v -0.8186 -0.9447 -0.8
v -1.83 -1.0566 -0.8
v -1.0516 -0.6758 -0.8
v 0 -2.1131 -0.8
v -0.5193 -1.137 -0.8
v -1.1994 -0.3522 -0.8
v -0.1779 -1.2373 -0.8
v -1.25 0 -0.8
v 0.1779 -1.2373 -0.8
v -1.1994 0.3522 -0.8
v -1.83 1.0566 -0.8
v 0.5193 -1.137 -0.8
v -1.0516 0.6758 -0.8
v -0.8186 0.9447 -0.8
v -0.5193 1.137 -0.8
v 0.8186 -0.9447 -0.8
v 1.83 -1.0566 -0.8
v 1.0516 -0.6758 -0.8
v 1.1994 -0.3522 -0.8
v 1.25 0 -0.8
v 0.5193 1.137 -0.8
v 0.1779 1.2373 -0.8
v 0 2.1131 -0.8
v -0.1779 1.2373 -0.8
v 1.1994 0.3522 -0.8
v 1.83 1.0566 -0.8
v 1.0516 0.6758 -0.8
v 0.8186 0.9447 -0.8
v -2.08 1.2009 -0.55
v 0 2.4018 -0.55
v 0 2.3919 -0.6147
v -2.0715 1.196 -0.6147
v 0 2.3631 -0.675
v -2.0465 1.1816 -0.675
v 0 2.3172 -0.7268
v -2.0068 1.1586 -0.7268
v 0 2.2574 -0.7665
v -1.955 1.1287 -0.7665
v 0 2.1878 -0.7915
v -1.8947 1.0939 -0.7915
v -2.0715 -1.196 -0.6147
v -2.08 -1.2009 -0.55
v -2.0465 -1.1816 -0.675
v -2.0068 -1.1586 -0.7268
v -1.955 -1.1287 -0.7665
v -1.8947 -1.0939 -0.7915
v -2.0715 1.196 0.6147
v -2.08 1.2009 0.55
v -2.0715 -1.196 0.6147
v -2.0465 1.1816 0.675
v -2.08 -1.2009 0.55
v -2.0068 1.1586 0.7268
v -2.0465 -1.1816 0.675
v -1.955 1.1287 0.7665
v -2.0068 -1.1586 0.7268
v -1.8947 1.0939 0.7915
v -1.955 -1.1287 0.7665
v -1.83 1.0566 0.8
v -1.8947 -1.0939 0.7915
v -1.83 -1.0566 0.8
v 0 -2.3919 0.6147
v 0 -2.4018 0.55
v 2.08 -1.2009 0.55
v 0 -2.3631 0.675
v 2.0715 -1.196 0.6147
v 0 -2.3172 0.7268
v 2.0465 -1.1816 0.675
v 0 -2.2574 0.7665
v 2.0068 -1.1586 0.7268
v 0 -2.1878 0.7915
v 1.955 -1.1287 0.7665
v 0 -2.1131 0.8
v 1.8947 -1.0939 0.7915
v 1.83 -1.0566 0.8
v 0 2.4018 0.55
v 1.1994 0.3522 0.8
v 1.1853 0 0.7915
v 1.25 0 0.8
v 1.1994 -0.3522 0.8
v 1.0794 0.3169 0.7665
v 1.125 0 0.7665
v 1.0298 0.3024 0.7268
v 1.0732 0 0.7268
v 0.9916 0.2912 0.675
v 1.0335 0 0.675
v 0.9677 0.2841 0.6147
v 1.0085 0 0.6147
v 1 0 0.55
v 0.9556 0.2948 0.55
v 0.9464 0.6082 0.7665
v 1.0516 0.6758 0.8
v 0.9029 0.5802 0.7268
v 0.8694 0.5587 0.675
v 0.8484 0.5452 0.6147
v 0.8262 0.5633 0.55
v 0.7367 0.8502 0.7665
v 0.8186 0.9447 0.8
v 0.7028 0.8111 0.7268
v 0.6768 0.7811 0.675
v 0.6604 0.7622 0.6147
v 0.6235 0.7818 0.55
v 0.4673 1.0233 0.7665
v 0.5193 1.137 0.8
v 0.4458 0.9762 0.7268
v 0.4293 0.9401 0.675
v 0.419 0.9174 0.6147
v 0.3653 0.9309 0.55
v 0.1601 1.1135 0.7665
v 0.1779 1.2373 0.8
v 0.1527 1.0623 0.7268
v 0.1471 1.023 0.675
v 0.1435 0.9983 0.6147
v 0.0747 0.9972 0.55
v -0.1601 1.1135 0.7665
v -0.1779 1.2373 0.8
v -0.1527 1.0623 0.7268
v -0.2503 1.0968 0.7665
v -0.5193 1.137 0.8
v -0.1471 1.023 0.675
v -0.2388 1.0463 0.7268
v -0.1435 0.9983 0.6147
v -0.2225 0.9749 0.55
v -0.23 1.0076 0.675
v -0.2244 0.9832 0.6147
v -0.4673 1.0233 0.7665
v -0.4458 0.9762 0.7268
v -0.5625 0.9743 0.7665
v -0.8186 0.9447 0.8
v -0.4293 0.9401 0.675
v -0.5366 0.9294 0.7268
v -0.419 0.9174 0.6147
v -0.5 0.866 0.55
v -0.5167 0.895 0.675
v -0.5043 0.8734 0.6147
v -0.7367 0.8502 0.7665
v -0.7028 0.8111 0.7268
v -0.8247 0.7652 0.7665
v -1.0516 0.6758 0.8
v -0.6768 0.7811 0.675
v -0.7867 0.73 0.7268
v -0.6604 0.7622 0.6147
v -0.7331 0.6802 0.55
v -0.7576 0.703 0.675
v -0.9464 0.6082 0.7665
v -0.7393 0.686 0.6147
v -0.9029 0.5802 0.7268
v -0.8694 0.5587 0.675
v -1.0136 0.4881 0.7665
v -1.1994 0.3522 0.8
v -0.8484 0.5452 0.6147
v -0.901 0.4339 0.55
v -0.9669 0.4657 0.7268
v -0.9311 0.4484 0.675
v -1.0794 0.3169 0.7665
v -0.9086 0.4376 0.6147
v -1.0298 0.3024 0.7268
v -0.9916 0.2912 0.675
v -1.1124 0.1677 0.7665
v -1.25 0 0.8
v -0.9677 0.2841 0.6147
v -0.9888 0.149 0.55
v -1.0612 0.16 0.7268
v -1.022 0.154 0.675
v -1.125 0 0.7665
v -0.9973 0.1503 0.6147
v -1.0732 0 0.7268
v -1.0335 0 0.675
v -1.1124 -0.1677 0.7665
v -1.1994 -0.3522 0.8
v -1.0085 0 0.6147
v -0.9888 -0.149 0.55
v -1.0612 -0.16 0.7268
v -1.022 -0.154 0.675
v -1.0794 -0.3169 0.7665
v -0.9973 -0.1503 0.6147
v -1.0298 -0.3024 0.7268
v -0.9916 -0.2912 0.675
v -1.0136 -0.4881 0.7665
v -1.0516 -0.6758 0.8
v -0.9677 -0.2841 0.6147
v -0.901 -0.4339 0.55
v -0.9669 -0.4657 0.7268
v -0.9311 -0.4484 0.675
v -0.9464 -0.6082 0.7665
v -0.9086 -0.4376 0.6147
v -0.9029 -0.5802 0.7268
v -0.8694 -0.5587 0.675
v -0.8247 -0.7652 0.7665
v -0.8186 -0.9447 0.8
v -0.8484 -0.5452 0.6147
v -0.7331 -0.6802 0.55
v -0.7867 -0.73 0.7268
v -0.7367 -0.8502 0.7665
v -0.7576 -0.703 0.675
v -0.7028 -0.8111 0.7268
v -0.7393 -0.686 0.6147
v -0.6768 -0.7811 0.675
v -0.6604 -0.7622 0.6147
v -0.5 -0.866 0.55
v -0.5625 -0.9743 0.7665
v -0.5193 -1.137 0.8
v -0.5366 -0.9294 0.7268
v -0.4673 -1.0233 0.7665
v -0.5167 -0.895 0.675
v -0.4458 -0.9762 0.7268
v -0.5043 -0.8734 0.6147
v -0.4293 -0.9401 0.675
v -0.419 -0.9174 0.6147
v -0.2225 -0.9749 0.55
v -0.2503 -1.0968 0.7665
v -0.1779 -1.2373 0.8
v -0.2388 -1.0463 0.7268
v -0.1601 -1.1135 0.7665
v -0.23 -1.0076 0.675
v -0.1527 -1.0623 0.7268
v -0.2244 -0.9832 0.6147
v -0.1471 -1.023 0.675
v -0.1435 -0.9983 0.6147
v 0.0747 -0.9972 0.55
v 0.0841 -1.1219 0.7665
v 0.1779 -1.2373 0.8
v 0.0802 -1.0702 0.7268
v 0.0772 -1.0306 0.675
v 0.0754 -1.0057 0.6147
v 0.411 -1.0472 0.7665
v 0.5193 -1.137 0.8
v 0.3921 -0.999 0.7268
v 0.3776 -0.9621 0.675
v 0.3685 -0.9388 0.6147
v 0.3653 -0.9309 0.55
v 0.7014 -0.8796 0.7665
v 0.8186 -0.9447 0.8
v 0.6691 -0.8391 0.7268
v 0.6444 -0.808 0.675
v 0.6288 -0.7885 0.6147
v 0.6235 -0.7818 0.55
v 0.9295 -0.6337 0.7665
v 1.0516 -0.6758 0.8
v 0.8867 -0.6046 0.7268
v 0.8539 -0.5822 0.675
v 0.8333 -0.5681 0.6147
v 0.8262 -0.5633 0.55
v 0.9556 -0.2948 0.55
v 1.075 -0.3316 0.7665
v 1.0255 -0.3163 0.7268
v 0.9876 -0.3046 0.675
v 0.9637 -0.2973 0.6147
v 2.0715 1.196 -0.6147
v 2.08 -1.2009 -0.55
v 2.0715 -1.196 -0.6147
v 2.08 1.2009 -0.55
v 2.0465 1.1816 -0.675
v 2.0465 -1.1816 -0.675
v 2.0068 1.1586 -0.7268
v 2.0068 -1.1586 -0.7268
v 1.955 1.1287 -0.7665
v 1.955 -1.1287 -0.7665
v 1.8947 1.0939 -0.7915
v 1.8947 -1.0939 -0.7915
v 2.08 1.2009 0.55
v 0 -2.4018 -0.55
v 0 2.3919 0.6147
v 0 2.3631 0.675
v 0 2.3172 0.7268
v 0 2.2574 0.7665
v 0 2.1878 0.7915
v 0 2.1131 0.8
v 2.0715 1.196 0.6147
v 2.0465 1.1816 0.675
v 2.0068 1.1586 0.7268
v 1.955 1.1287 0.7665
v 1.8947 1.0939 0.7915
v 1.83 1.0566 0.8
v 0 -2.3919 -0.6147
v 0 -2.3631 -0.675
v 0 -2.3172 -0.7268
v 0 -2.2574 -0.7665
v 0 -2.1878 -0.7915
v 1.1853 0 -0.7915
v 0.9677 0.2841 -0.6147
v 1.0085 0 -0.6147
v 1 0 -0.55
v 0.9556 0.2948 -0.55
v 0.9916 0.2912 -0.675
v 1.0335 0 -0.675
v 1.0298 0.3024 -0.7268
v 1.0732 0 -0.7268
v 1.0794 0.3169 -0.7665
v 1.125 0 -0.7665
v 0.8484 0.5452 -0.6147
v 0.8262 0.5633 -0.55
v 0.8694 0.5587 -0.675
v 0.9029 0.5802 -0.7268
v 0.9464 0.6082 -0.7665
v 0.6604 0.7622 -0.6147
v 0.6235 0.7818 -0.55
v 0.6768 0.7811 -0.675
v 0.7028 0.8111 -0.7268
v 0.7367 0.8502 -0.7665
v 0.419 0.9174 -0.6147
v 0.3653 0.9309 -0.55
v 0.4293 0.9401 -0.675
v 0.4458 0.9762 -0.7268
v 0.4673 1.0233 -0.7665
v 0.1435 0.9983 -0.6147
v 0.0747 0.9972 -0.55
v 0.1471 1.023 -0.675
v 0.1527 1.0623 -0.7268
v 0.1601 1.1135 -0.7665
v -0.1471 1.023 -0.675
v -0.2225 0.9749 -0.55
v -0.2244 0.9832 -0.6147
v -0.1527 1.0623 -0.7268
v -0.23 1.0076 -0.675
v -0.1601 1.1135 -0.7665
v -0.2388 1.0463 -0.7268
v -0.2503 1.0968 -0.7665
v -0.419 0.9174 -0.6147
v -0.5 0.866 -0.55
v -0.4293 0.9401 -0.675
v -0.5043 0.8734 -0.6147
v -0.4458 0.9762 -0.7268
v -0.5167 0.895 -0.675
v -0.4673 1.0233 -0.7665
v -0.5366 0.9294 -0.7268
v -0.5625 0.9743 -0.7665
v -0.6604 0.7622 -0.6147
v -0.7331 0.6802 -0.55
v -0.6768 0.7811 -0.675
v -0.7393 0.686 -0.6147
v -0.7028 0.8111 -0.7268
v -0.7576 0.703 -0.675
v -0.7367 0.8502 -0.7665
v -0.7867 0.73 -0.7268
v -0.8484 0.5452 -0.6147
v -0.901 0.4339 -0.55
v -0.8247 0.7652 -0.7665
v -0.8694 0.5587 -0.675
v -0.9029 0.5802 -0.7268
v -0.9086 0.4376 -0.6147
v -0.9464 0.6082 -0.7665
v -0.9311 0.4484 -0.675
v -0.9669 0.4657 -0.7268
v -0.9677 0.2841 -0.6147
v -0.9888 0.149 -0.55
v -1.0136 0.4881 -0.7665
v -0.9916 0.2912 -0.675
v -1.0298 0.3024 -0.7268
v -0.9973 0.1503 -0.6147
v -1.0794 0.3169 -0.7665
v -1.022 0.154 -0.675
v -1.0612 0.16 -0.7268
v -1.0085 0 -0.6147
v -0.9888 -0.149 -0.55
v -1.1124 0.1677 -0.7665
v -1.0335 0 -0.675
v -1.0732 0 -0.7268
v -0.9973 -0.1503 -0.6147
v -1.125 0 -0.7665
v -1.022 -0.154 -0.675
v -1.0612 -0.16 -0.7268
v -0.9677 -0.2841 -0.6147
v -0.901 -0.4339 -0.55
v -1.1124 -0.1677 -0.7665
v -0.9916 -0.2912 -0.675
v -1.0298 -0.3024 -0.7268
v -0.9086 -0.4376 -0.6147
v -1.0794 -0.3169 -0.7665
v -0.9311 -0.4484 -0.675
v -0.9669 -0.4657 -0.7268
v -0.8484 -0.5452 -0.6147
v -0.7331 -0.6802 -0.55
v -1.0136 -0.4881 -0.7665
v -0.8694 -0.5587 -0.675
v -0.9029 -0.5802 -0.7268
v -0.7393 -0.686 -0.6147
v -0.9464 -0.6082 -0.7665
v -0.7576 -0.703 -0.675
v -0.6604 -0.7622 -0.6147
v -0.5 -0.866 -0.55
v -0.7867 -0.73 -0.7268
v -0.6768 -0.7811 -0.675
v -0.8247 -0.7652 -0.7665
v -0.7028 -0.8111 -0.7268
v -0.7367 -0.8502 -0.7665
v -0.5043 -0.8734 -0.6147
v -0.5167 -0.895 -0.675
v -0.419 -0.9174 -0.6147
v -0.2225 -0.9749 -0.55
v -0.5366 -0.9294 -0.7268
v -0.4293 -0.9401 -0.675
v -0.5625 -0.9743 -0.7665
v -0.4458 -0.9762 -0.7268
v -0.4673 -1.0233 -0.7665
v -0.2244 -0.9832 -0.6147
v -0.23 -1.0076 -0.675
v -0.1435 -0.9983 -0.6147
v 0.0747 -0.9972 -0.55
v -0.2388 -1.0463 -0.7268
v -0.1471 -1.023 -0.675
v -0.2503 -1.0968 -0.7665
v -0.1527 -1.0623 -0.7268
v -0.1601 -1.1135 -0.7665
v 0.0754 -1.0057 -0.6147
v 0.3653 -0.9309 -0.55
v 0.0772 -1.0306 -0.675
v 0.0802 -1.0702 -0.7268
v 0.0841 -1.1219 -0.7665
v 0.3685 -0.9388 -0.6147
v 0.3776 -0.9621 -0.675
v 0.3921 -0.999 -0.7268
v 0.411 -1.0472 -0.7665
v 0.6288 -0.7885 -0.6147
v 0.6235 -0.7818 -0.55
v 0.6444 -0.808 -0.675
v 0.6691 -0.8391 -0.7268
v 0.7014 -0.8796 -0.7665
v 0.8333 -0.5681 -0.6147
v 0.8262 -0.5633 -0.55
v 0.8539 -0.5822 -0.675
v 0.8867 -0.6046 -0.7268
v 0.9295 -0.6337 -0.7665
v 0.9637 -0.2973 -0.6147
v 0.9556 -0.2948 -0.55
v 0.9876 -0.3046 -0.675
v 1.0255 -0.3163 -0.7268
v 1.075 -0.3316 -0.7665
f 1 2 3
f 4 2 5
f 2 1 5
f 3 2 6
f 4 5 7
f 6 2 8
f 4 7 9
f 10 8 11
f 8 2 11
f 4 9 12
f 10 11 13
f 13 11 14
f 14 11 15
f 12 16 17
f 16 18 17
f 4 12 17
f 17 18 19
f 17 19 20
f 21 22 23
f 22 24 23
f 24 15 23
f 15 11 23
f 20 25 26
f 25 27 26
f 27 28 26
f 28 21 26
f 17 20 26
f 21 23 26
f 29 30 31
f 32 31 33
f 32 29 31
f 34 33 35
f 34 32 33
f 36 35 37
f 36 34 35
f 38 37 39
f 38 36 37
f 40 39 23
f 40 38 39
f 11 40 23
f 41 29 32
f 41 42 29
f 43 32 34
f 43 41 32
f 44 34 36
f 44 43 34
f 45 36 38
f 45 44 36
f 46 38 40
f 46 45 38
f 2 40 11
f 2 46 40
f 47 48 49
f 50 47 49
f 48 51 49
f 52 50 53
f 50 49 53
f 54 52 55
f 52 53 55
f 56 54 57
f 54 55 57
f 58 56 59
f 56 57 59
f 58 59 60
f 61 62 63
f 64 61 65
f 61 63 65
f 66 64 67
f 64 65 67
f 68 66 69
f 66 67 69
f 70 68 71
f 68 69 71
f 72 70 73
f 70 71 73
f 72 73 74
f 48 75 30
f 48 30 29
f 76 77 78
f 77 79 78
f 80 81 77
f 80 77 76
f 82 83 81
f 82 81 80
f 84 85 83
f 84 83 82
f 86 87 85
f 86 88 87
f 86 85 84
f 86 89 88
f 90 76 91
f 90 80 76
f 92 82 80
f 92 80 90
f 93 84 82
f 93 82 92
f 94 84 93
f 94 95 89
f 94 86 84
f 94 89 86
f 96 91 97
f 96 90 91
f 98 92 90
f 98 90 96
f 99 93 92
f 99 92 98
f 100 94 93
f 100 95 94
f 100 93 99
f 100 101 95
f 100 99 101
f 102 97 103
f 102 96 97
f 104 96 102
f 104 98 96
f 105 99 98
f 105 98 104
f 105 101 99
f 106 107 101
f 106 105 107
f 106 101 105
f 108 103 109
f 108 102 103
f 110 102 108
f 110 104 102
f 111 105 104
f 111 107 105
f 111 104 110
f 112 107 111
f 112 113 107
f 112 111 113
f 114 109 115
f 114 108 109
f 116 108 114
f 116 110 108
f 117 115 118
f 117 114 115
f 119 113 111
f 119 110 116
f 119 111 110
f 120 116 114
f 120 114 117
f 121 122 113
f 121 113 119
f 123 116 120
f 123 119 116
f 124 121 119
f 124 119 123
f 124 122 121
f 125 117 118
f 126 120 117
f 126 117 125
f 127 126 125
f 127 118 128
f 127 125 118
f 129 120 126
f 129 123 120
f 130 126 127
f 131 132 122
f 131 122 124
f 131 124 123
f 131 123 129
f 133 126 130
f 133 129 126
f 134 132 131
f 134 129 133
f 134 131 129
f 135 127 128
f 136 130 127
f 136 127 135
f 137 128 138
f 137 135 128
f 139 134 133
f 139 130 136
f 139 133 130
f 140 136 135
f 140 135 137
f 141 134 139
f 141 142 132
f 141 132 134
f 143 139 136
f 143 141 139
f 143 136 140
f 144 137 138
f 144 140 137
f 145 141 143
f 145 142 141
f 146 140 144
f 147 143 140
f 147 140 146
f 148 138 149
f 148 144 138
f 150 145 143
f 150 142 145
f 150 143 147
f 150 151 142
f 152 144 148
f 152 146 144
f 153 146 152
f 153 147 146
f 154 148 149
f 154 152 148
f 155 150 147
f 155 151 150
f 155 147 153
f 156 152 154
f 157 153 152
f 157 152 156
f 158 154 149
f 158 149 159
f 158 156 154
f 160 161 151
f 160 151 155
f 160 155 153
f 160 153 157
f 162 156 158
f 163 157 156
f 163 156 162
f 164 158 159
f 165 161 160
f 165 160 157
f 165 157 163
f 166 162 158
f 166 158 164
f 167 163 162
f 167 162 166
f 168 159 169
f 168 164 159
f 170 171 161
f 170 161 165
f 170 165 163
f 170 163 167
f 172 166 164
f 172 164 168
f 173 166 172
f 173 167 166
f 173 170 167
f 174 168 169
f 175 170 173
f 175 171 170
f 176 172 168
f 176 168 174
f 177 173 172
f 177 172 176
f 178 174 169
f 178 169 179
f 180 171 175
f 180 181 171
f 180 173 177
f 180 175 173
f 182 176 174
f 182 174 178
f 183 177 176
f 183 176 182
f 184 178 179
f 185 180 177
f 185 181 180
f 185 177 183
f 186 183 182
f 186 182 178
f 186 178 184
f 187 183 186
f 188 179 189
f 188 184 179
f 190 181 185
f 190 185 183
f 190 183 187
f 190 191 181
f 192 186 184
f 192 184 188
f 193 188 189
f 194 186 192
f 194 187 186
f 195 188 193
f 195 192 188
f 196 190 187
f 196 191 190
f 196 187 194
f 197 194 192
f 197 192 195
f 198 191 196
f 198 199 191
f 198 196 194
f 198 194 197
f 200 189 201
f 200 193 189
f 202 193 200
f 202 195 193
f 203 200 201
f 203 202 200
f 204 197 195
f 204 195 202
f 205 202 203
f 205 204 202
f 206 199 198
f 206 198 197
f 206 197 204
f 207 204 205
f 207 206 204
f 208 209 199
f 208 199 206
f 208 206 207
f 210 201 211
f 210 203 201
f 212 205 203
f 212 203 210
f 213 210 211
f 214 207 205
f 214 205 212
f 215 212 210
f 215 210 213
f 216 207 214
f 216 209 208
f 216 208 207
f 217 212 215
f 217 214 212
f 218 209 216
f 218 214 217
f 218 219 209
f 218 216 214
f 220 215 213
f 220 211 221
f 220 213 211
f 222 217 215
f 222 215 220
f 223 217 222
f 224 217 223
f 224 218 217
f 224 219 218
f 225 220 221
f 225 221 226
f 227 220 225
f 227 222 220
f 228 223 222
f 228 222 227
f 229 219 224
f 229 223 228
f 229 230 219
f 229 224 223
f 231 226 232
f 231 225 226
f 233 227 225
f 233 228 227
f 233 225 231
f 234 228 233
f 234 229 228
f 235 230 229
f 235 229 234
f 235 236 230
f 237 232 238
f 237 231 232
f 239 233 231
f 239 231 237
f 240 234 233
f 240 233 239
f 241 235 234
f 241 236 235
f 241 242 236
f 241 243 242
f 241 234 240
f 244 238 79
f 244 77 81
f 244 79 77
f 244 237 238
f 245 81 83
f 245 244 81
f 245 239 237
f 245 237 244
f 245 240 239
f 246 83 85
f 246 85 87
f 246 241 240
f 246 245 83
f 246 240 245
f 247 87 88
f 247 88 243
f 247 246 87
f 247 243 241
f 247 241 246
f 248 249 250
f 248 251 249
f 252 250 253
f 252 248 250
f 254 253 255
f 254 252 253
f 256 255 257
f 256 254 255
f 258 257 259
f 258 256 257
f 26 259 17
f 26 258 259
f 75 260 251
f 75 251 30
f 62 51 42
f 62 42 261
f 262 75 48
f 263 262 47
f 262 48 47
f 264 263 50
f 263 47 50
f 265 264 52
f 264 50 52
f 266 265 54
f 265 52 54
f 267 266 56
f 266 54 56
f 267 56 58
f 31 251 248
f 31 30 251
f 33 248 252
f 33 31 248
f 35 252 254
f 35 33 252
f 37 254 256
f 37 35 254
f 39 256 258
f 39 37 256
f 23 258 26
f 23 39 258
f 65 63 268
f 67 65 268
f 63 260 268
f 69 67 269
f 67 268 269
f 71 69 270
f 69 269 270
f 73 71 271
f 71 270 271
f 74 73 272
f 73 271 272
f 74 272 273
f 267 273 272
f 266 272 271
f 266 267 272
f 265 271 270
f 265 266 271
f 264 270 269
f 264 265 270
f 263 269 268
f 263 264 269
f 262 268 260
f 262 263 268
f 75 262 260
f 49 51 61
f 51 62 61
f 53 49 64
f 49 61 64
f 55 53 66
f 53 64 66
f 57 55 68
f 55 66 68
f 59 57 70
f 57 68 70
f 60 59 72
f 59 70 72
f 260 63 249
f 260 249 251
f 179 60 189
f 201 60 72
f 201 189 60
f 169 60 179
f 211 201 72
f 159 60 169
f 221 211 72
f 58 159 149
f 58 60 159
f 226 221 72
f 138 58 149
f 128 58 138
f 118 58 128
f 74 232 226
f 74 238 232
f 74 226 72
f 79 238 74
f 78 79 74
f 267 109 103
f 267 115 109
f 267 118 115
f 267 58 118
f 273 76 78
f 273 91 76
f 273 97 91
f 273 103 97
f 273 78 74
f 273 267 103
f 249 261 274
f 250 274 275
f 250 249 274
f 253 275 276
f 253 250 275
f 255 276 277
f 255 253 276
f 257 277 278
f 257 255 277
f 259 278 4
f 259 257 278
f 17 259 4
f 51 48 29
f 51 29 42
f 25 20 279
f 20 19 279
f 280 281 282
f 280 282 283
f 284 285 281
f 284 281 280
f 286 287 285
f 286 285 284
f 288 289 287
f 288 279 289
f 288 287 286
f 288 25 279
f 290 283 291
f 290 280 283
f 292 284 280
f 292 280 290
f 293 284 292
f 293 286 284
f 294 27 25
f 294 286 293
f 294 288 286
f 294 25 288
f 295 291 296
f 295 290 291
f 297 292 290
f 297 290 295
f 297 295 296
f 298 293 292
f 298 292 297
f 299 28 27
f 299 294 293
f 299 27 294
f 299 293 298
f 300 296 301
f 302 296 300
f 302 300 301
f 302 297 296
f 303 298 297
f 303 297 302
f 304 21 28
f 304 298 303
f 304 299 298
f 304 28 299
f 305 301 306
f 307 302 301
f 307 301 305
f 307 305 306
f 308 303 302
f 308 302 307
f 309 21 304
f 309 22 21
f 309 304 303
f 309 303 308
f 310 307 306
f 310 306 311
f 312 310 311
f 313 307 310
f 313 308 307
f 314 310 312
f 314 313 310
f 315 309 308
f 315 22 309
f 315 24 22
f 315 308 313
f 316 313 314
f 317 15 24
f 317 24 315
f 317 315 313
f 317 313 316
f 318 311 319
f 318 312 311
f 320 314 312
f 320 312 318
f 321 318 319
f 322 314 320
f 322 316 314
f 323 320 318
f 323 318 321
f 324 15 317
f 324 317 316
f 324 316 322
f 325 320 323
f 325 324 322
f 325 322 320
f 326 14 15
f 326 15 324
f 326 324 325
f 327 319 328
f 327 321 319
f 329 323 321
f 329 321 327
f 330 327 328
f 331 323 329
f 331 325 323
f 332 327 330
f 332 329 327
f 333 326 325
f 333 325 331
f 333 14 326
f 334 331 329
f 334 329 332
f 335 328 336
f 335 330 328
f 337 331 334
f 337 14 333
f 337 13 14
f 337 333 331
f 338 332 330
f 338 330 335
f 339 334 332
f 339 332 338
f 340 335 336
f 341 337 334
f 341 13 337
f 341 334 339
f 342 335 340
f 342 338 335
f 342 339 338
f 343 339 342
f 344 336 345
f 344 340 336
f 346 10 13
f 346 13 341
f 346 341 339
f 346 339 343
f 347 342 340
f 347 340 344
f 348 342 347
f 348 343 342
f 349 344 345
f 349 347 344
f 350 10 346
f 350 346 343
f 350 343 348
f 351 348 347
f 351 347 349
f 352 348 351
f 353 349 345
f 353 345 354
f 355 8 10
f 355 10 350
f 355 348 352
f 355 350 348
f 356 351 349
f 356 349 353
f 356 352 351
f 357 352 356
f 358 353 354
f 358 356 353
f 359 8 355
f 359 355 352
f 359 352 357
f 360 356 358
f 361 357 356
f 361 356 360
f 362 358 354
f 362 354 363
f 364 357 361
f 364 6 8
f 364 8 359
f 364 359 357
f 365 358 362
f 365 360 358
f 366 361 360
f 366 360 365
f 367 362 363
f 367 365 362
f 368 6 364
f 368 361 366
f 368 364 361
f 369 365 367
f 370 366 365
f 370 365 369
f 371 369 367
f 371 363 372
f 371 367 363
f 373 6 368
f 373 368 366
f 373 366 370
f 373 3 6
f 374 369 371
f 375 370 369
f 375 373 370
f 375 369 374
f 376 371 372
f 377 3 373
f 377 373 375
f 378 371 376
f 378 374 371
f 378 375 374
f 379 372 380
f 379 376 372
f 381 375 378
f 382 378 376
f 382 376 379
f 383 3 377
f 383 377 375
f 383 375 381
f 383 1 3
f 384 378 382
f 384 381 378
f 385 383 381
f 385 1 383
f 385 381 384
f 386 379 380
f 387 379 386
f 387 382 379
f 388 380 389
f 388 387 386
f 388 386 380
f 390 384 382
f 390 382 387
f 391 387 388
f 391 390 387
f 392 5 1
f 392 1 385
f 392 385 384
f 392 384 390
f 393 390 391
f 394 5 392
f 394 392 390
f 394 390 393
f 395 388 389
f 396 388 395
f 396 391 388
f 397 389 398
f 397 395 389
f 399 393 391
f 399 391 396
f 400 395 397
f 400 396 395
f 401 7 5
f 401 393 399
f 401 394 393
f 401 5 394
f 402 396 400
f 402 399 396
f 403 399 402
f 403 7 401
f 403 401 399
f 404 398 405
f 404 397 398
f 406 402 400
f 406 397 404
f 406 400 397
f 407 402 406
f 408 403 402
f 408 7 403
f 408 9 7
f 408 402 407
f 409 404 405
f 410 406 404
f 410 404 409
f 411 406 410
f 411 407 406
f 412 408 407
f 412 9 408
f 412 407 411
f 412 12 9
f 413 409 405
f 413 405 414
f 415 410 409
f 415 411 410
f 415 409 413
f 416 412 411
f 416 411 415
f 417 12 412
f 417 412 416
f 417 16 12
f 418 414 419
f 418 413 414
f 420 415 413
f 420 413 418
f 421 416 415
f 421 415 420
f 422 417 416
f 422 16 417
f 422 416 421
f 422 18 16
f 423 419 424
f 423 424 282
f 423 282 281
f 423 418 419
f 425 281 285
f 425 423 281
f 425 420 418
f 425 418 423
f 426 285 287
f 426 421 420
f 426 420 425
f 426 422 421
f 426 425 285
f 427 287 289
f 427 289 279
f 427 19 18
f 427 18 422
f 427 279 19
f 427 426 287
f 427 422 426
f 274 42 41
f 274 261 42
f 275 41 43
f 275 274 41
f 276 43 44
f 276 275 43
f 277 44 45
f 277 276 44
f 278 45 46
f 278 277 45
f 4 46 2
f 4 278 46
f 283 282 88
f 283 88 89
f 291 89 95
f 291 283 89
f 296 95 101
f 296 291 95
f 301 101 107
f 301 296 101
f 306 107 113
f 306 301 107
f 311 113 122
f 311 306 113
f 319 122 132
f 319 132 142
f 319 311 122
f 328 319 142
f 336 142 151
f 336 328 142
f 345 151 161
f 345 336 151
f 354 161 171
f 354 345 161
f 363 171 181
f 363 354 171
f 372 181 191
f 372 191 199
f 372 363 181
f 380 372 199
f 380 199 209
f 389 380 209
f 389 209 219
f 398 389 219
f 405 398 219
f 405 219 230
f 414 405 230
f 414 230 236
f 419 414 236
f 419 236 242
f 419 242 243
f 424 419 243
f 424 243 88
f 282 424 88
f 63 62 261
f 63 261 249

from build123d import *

# Parameters (mm, degrees)
SKETCH1_R           = 1
BOSS_EXTRUDE1_DEPTH = 0.8
FILLET1_R           = 0.25


with BuildPart() as part:
    # Sketch1 → Boss-Extrude1 (new, symmetric)
    with BuildSketch(Plane.XY):
        Polygon((2.08, -1.20088856), (2.08, 1.20088856), (0, 2.40177712), (-2.08, 1.20088856), (-2.08, -1.20088856), (0, -2.40177712), align=None)
        Circle(SKETCH1_R, mode=Mode.SUBTRACT)
    extrude(amount=BOSS_EXTRUDE1_DEPTH, both=True)

    # Fillet1
    fillet1_edges = [part.edges().sort_by_distance(p)[0] for p in [
        (1.04, 1.80133284, 0.8),
        (-1.04, 1.80133284, 0.8),
        (-1, 0, -0.8),
        (-1, 0, 0.8),
        (-2.08, 0, 0.8),
        (-1.04, -1.80133284, 0.8),
        (1.04, -1.80133284, 0.8),
        (-1.04, -1.80133284, -0.8),
        (-2.08, 0, -0.8),
        (-1.04, 1.80133284, -0.8),
        (1.04, 1.80133284, -0.8),
        (2.08, 0, -0.8),
        (1.04, -1.80133284, -0.8),
        (2.08, 0, 0.8),
    ]]
    fillet(fillet1_edges, radius=FILLET1_R)


solid = part.part
